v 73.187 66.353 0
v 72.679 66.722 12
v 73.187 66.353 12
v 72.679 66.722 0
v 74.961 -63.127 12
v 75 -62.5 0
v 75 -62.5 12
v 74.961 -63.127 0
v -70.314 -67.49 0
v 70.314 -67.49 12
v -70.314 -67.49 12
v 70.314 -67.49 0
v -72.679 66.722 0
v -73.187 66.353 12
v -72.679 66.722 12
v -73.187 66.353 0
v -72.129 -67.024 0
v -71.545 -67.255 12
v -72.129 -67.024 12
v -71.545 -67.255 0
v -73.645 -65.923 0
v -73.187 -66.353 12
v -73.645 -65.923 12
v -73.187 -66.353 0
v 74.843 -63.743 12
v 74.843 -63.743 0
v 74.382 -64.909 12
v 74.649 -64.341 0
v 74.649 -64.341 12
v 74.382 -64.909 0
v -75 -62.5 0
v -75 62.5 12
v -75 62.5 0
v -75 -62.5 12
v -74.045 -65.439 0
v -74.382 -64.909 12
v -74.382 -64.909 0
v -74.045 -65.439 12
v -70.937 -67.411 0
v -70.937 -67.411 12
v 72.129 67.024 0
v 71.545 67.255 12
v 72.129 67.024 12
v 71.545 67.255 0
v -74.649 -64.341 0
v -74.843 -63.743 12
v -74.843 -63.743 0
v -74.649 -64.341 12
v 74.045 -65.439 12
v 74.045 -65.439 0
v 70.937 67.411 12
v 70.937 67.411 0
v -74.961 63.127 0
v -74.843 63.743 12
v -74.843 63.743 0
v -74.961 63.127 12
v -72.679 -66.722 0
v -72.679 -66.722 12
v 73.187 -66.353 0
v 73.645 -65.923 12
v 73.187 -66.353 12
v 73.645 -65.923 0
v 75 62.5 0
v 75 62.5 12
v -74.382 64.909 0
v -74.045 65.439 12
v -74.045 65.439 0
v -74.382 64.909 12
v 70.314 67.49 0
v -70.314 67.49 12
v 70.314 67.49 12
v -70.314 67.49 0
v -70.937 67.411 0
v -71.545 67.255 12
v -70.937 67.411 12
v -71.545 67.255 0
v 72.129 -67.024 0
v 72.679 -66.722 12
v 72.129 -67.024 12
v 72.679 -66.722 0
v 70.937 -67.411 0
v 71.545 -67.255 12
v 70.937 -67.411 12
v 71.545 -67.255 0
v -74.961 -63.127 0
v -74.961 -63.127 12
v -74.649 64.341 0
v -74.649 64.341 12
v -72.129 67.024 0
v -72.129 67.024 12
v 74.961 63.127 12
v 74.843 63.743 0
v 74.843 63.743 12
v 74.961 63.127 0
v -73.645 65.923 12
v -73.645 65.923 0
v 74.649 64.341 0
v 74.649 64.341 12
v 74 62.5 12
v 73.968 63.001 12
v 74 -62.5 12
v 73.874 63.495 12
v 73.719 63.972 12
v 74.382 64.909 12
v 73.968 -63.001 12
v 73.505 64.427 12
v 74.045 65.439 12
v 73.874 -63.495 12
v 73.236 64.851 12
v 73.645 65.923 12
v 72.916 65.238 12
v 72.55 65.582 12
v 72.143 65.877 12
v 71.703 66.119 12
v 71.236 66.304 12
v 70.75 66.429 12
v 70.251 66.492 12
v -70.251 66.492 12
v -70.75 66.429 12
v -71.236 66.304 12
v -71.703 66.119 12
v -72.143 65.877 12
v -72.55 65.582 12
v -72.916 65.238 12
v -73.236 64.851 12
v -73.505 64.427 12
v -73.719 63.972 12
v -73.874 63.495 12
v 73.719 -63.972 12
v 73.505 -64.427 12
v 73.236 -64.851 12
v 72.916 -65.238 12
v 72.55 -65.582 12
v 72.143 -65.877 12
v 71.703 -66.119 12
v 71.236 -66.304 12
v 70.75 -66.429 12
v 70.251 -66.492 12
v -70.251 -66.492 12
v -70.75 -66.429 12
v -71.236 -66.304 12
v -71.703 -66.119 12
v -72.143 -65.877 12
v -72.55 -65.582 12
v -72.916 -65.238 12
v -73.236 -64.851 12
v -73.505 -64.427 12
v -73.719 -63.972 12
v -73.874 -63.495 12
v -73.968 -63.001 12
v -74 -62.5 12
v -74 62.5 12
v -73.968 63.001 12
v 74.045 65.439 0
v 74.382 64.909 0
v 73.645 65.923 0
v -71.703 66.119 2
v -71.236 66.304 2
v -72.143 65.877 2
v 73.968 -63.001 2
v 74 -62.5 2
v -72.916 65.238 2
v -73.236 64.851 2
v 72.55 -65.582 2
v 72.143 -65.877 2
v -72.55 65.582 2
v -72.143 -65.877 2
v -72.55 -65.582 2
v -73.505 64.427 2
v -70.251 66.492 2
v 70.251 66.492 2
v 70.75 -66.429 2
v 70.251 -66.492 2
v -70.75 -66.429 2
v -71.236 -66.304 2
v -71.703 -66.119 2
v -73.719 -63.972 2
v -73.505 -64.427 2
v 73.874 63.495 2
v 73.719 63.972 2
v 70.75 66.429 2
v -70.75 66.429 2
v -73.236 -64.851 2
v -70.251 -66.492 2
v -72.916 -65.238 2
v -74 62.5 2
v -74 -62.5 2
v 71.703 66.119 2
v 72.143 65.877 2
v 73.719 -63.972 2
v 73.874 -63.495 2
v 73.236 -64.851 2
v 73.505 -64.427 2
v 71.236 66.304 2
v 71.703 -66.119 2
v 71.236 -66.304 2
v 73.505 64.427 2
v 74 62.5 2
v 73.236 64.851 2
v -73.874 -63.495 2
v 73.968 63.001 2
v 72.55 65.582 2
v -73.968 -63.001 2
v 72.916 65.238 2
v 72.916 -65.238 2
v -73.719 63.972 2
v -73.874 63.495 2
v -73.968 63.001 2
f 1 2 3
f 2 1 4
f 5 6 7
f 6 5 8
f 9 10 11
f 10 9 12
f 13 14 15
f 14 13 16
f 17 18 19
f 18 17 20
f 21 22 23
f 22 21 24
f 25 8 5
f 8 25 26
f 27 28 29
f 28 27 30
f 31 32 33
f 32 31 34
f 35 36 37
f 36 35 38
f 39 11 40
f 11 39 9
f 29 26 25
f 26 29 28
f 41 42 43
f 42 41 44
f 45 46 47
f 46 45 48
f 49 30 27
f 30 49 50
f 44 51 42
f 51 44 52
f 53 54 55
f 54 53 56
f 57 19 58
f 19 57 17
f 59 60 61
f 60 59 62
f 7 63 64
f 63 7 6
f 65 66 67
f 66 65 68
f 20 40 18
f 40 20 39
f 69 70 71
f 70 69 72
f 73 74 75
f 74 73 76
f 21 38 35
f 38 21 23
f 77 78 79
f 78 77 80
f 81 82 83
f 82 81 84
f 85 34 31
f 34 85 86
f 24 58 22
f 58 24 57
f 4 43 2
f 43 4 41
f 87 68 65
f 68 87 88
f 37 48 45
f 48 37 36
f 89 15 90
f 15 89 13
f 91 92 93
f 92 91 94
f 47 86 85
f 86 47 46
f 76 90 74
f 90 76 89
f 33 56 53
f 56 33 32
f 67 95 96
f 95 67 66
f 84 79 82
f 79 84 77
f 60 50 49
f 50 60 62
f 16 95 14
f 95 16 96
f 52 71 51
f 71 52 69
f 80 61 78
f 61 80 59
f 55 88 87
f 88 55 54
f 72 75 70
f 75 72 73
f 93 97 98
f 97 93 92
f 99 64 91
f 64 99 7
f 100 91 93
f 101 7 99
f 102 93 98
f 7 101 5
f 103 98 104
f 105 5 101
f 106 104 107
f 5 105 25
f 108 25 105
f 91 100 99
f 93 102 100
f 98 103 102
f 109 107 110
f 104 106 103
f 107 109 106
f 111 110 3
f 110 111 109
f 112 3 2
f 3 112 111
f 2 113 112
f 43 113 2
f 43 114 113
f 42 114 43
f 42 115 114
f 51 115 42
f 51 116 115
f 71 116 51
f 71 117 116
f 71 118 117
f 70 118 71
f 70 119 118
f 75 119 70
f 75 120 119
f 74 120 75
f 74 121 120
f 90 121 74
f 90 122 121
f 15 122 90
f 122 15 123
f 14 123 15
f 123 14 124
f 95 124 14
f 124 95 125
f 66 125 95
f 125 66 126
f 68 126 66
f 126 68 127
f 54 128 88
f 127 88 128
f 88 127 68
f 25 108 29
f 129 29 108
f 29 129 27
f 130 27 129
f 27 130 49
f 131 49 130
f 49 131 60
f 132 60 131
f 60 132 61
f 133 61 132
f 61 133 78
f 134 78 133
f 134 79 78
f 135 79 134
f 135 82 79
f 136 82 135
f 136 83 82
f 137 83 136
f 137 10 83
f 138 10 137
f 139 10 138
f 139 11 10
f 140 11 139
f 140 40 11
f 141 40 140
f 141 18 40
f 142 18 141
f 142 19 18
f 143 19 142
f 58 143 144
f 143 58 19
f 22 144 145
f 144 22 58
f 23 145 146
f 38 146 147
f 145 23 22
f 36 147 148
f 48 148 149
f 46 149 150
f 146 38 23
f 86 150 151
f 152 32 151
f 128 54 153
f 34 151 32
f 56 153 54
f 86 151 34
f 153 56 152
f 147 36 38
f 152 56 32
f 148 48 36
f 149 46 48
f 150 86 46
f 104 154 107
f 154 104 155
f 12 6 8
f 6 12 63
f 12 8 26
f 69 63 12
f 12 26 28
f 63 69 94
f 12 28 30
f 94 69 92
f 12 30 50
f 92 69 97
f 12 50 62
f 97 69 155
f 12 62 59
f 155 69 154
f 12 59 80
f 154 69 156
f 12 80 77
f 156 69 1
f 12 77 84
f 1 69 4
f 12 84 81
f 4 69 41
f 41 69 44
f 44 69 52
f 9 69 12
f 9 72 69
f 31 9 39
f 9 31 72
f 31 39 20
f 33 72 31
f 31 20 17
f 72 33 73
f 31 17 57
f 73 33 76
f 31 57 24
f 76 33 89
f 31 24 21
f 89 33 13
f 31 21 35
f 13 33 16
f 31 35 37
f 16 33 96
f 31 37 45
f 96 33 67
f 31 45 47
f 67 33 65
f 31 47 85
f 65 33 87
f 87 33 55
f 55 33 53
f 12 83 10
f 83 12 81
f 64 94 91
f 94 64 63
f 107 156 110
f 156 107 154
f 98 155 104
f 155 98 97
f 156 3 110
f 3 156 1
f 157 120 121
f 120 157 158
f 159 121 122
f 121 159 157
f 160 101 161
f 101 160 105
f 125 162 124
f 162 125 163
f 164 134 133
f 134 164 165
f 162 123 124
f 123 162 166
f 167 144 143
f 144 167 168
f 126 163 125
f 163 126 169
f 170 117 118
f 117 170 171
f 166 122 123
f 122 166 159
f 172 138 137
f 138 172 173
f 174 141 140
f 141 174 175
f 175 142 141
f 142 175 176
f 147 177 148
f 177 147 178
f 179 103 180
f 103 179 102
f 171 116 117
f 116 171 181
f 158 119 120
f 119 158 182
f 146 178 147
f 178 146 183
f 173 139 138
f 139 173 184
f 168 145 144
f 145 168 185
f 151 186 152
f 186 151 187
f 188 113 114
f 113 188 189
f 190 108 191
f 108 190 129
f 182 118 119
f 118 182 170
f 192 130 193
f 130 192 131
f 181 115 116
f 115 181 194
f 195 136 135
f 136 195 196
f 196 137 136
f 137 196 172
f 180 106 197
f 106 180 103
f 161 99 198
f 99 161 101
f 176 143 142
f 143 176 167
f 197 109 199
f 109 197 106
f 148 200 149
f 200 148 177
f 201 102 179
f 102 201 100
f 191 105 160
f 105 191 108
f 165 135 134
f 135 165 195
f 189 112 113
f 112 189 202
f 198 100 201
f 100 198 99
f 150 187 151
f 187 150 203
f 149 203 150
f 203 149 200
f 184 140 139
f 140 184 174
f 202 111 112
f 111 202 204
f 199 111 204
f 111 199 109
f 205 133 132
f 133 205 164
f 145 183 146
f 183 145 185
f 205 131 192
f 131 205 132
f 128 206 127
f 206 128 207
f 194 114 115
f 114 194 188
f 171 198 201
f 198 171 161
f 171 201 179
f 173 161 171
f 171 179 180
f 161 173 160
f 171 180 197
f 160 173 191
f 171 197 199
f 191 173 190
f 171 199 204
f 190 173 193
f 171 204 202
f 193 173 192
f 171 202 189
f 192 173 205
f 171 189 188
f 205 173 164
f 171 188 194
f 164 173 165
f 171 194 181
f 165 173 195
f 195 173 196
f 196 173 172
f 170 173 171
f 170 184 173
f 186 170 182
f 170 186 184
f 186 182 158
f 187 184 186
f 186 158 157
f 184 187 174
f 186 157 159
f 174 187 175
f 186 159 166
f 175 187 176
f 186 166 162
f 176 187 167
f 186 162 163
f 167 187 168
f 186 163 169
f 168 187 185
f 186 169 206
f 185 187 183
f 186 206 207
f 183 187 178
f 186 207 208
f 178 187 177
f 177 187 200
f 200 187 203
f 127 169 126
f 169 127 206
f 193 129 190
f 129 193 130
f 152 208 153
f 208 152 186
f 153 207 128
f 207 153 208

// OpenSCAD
$fn = 50;


difference() {
	union() {
		hull() {
			translate(v = [-70.0000000000, 62.5000000000, 0]) {
				cylinder(h = 12, r = 5);
			}
			translate(v = [70.0000000000, 62.5000000000, 0]) {
				cylinder(h = 12, r = 5);
			}
			translate(v = [-70.0000000000, -62.5000000000, 0]) {
				cylinder(h = 12, r = 5);
			}
			translate(v = [70.0000000000, -62.5000000000, 0]) {
				cylinder(h = 12, r = 5);
			}
		}
	}
	union() {
		translate(v = [0, 0, 2]) {
			hull() {
				translate(v = [-70.0000000000, 62.5000000000, 0]) {
					cylinder(h = 10, r = 4);
				}
				translate(v = [70.0000000000, 62.5000000000, 0]) {
					cylinder(h = 10, r = 4);
				}
				translate(v = [-70.0000000000, -62.5000000000, 0]) {
					cylinder(h = 10, r = 4);
				}
				translate(v = [70.0000000000, -62.5000000000, 0]) {
					cylinder(h = 10, r = 4);
				}
			}
		}
	}
}
